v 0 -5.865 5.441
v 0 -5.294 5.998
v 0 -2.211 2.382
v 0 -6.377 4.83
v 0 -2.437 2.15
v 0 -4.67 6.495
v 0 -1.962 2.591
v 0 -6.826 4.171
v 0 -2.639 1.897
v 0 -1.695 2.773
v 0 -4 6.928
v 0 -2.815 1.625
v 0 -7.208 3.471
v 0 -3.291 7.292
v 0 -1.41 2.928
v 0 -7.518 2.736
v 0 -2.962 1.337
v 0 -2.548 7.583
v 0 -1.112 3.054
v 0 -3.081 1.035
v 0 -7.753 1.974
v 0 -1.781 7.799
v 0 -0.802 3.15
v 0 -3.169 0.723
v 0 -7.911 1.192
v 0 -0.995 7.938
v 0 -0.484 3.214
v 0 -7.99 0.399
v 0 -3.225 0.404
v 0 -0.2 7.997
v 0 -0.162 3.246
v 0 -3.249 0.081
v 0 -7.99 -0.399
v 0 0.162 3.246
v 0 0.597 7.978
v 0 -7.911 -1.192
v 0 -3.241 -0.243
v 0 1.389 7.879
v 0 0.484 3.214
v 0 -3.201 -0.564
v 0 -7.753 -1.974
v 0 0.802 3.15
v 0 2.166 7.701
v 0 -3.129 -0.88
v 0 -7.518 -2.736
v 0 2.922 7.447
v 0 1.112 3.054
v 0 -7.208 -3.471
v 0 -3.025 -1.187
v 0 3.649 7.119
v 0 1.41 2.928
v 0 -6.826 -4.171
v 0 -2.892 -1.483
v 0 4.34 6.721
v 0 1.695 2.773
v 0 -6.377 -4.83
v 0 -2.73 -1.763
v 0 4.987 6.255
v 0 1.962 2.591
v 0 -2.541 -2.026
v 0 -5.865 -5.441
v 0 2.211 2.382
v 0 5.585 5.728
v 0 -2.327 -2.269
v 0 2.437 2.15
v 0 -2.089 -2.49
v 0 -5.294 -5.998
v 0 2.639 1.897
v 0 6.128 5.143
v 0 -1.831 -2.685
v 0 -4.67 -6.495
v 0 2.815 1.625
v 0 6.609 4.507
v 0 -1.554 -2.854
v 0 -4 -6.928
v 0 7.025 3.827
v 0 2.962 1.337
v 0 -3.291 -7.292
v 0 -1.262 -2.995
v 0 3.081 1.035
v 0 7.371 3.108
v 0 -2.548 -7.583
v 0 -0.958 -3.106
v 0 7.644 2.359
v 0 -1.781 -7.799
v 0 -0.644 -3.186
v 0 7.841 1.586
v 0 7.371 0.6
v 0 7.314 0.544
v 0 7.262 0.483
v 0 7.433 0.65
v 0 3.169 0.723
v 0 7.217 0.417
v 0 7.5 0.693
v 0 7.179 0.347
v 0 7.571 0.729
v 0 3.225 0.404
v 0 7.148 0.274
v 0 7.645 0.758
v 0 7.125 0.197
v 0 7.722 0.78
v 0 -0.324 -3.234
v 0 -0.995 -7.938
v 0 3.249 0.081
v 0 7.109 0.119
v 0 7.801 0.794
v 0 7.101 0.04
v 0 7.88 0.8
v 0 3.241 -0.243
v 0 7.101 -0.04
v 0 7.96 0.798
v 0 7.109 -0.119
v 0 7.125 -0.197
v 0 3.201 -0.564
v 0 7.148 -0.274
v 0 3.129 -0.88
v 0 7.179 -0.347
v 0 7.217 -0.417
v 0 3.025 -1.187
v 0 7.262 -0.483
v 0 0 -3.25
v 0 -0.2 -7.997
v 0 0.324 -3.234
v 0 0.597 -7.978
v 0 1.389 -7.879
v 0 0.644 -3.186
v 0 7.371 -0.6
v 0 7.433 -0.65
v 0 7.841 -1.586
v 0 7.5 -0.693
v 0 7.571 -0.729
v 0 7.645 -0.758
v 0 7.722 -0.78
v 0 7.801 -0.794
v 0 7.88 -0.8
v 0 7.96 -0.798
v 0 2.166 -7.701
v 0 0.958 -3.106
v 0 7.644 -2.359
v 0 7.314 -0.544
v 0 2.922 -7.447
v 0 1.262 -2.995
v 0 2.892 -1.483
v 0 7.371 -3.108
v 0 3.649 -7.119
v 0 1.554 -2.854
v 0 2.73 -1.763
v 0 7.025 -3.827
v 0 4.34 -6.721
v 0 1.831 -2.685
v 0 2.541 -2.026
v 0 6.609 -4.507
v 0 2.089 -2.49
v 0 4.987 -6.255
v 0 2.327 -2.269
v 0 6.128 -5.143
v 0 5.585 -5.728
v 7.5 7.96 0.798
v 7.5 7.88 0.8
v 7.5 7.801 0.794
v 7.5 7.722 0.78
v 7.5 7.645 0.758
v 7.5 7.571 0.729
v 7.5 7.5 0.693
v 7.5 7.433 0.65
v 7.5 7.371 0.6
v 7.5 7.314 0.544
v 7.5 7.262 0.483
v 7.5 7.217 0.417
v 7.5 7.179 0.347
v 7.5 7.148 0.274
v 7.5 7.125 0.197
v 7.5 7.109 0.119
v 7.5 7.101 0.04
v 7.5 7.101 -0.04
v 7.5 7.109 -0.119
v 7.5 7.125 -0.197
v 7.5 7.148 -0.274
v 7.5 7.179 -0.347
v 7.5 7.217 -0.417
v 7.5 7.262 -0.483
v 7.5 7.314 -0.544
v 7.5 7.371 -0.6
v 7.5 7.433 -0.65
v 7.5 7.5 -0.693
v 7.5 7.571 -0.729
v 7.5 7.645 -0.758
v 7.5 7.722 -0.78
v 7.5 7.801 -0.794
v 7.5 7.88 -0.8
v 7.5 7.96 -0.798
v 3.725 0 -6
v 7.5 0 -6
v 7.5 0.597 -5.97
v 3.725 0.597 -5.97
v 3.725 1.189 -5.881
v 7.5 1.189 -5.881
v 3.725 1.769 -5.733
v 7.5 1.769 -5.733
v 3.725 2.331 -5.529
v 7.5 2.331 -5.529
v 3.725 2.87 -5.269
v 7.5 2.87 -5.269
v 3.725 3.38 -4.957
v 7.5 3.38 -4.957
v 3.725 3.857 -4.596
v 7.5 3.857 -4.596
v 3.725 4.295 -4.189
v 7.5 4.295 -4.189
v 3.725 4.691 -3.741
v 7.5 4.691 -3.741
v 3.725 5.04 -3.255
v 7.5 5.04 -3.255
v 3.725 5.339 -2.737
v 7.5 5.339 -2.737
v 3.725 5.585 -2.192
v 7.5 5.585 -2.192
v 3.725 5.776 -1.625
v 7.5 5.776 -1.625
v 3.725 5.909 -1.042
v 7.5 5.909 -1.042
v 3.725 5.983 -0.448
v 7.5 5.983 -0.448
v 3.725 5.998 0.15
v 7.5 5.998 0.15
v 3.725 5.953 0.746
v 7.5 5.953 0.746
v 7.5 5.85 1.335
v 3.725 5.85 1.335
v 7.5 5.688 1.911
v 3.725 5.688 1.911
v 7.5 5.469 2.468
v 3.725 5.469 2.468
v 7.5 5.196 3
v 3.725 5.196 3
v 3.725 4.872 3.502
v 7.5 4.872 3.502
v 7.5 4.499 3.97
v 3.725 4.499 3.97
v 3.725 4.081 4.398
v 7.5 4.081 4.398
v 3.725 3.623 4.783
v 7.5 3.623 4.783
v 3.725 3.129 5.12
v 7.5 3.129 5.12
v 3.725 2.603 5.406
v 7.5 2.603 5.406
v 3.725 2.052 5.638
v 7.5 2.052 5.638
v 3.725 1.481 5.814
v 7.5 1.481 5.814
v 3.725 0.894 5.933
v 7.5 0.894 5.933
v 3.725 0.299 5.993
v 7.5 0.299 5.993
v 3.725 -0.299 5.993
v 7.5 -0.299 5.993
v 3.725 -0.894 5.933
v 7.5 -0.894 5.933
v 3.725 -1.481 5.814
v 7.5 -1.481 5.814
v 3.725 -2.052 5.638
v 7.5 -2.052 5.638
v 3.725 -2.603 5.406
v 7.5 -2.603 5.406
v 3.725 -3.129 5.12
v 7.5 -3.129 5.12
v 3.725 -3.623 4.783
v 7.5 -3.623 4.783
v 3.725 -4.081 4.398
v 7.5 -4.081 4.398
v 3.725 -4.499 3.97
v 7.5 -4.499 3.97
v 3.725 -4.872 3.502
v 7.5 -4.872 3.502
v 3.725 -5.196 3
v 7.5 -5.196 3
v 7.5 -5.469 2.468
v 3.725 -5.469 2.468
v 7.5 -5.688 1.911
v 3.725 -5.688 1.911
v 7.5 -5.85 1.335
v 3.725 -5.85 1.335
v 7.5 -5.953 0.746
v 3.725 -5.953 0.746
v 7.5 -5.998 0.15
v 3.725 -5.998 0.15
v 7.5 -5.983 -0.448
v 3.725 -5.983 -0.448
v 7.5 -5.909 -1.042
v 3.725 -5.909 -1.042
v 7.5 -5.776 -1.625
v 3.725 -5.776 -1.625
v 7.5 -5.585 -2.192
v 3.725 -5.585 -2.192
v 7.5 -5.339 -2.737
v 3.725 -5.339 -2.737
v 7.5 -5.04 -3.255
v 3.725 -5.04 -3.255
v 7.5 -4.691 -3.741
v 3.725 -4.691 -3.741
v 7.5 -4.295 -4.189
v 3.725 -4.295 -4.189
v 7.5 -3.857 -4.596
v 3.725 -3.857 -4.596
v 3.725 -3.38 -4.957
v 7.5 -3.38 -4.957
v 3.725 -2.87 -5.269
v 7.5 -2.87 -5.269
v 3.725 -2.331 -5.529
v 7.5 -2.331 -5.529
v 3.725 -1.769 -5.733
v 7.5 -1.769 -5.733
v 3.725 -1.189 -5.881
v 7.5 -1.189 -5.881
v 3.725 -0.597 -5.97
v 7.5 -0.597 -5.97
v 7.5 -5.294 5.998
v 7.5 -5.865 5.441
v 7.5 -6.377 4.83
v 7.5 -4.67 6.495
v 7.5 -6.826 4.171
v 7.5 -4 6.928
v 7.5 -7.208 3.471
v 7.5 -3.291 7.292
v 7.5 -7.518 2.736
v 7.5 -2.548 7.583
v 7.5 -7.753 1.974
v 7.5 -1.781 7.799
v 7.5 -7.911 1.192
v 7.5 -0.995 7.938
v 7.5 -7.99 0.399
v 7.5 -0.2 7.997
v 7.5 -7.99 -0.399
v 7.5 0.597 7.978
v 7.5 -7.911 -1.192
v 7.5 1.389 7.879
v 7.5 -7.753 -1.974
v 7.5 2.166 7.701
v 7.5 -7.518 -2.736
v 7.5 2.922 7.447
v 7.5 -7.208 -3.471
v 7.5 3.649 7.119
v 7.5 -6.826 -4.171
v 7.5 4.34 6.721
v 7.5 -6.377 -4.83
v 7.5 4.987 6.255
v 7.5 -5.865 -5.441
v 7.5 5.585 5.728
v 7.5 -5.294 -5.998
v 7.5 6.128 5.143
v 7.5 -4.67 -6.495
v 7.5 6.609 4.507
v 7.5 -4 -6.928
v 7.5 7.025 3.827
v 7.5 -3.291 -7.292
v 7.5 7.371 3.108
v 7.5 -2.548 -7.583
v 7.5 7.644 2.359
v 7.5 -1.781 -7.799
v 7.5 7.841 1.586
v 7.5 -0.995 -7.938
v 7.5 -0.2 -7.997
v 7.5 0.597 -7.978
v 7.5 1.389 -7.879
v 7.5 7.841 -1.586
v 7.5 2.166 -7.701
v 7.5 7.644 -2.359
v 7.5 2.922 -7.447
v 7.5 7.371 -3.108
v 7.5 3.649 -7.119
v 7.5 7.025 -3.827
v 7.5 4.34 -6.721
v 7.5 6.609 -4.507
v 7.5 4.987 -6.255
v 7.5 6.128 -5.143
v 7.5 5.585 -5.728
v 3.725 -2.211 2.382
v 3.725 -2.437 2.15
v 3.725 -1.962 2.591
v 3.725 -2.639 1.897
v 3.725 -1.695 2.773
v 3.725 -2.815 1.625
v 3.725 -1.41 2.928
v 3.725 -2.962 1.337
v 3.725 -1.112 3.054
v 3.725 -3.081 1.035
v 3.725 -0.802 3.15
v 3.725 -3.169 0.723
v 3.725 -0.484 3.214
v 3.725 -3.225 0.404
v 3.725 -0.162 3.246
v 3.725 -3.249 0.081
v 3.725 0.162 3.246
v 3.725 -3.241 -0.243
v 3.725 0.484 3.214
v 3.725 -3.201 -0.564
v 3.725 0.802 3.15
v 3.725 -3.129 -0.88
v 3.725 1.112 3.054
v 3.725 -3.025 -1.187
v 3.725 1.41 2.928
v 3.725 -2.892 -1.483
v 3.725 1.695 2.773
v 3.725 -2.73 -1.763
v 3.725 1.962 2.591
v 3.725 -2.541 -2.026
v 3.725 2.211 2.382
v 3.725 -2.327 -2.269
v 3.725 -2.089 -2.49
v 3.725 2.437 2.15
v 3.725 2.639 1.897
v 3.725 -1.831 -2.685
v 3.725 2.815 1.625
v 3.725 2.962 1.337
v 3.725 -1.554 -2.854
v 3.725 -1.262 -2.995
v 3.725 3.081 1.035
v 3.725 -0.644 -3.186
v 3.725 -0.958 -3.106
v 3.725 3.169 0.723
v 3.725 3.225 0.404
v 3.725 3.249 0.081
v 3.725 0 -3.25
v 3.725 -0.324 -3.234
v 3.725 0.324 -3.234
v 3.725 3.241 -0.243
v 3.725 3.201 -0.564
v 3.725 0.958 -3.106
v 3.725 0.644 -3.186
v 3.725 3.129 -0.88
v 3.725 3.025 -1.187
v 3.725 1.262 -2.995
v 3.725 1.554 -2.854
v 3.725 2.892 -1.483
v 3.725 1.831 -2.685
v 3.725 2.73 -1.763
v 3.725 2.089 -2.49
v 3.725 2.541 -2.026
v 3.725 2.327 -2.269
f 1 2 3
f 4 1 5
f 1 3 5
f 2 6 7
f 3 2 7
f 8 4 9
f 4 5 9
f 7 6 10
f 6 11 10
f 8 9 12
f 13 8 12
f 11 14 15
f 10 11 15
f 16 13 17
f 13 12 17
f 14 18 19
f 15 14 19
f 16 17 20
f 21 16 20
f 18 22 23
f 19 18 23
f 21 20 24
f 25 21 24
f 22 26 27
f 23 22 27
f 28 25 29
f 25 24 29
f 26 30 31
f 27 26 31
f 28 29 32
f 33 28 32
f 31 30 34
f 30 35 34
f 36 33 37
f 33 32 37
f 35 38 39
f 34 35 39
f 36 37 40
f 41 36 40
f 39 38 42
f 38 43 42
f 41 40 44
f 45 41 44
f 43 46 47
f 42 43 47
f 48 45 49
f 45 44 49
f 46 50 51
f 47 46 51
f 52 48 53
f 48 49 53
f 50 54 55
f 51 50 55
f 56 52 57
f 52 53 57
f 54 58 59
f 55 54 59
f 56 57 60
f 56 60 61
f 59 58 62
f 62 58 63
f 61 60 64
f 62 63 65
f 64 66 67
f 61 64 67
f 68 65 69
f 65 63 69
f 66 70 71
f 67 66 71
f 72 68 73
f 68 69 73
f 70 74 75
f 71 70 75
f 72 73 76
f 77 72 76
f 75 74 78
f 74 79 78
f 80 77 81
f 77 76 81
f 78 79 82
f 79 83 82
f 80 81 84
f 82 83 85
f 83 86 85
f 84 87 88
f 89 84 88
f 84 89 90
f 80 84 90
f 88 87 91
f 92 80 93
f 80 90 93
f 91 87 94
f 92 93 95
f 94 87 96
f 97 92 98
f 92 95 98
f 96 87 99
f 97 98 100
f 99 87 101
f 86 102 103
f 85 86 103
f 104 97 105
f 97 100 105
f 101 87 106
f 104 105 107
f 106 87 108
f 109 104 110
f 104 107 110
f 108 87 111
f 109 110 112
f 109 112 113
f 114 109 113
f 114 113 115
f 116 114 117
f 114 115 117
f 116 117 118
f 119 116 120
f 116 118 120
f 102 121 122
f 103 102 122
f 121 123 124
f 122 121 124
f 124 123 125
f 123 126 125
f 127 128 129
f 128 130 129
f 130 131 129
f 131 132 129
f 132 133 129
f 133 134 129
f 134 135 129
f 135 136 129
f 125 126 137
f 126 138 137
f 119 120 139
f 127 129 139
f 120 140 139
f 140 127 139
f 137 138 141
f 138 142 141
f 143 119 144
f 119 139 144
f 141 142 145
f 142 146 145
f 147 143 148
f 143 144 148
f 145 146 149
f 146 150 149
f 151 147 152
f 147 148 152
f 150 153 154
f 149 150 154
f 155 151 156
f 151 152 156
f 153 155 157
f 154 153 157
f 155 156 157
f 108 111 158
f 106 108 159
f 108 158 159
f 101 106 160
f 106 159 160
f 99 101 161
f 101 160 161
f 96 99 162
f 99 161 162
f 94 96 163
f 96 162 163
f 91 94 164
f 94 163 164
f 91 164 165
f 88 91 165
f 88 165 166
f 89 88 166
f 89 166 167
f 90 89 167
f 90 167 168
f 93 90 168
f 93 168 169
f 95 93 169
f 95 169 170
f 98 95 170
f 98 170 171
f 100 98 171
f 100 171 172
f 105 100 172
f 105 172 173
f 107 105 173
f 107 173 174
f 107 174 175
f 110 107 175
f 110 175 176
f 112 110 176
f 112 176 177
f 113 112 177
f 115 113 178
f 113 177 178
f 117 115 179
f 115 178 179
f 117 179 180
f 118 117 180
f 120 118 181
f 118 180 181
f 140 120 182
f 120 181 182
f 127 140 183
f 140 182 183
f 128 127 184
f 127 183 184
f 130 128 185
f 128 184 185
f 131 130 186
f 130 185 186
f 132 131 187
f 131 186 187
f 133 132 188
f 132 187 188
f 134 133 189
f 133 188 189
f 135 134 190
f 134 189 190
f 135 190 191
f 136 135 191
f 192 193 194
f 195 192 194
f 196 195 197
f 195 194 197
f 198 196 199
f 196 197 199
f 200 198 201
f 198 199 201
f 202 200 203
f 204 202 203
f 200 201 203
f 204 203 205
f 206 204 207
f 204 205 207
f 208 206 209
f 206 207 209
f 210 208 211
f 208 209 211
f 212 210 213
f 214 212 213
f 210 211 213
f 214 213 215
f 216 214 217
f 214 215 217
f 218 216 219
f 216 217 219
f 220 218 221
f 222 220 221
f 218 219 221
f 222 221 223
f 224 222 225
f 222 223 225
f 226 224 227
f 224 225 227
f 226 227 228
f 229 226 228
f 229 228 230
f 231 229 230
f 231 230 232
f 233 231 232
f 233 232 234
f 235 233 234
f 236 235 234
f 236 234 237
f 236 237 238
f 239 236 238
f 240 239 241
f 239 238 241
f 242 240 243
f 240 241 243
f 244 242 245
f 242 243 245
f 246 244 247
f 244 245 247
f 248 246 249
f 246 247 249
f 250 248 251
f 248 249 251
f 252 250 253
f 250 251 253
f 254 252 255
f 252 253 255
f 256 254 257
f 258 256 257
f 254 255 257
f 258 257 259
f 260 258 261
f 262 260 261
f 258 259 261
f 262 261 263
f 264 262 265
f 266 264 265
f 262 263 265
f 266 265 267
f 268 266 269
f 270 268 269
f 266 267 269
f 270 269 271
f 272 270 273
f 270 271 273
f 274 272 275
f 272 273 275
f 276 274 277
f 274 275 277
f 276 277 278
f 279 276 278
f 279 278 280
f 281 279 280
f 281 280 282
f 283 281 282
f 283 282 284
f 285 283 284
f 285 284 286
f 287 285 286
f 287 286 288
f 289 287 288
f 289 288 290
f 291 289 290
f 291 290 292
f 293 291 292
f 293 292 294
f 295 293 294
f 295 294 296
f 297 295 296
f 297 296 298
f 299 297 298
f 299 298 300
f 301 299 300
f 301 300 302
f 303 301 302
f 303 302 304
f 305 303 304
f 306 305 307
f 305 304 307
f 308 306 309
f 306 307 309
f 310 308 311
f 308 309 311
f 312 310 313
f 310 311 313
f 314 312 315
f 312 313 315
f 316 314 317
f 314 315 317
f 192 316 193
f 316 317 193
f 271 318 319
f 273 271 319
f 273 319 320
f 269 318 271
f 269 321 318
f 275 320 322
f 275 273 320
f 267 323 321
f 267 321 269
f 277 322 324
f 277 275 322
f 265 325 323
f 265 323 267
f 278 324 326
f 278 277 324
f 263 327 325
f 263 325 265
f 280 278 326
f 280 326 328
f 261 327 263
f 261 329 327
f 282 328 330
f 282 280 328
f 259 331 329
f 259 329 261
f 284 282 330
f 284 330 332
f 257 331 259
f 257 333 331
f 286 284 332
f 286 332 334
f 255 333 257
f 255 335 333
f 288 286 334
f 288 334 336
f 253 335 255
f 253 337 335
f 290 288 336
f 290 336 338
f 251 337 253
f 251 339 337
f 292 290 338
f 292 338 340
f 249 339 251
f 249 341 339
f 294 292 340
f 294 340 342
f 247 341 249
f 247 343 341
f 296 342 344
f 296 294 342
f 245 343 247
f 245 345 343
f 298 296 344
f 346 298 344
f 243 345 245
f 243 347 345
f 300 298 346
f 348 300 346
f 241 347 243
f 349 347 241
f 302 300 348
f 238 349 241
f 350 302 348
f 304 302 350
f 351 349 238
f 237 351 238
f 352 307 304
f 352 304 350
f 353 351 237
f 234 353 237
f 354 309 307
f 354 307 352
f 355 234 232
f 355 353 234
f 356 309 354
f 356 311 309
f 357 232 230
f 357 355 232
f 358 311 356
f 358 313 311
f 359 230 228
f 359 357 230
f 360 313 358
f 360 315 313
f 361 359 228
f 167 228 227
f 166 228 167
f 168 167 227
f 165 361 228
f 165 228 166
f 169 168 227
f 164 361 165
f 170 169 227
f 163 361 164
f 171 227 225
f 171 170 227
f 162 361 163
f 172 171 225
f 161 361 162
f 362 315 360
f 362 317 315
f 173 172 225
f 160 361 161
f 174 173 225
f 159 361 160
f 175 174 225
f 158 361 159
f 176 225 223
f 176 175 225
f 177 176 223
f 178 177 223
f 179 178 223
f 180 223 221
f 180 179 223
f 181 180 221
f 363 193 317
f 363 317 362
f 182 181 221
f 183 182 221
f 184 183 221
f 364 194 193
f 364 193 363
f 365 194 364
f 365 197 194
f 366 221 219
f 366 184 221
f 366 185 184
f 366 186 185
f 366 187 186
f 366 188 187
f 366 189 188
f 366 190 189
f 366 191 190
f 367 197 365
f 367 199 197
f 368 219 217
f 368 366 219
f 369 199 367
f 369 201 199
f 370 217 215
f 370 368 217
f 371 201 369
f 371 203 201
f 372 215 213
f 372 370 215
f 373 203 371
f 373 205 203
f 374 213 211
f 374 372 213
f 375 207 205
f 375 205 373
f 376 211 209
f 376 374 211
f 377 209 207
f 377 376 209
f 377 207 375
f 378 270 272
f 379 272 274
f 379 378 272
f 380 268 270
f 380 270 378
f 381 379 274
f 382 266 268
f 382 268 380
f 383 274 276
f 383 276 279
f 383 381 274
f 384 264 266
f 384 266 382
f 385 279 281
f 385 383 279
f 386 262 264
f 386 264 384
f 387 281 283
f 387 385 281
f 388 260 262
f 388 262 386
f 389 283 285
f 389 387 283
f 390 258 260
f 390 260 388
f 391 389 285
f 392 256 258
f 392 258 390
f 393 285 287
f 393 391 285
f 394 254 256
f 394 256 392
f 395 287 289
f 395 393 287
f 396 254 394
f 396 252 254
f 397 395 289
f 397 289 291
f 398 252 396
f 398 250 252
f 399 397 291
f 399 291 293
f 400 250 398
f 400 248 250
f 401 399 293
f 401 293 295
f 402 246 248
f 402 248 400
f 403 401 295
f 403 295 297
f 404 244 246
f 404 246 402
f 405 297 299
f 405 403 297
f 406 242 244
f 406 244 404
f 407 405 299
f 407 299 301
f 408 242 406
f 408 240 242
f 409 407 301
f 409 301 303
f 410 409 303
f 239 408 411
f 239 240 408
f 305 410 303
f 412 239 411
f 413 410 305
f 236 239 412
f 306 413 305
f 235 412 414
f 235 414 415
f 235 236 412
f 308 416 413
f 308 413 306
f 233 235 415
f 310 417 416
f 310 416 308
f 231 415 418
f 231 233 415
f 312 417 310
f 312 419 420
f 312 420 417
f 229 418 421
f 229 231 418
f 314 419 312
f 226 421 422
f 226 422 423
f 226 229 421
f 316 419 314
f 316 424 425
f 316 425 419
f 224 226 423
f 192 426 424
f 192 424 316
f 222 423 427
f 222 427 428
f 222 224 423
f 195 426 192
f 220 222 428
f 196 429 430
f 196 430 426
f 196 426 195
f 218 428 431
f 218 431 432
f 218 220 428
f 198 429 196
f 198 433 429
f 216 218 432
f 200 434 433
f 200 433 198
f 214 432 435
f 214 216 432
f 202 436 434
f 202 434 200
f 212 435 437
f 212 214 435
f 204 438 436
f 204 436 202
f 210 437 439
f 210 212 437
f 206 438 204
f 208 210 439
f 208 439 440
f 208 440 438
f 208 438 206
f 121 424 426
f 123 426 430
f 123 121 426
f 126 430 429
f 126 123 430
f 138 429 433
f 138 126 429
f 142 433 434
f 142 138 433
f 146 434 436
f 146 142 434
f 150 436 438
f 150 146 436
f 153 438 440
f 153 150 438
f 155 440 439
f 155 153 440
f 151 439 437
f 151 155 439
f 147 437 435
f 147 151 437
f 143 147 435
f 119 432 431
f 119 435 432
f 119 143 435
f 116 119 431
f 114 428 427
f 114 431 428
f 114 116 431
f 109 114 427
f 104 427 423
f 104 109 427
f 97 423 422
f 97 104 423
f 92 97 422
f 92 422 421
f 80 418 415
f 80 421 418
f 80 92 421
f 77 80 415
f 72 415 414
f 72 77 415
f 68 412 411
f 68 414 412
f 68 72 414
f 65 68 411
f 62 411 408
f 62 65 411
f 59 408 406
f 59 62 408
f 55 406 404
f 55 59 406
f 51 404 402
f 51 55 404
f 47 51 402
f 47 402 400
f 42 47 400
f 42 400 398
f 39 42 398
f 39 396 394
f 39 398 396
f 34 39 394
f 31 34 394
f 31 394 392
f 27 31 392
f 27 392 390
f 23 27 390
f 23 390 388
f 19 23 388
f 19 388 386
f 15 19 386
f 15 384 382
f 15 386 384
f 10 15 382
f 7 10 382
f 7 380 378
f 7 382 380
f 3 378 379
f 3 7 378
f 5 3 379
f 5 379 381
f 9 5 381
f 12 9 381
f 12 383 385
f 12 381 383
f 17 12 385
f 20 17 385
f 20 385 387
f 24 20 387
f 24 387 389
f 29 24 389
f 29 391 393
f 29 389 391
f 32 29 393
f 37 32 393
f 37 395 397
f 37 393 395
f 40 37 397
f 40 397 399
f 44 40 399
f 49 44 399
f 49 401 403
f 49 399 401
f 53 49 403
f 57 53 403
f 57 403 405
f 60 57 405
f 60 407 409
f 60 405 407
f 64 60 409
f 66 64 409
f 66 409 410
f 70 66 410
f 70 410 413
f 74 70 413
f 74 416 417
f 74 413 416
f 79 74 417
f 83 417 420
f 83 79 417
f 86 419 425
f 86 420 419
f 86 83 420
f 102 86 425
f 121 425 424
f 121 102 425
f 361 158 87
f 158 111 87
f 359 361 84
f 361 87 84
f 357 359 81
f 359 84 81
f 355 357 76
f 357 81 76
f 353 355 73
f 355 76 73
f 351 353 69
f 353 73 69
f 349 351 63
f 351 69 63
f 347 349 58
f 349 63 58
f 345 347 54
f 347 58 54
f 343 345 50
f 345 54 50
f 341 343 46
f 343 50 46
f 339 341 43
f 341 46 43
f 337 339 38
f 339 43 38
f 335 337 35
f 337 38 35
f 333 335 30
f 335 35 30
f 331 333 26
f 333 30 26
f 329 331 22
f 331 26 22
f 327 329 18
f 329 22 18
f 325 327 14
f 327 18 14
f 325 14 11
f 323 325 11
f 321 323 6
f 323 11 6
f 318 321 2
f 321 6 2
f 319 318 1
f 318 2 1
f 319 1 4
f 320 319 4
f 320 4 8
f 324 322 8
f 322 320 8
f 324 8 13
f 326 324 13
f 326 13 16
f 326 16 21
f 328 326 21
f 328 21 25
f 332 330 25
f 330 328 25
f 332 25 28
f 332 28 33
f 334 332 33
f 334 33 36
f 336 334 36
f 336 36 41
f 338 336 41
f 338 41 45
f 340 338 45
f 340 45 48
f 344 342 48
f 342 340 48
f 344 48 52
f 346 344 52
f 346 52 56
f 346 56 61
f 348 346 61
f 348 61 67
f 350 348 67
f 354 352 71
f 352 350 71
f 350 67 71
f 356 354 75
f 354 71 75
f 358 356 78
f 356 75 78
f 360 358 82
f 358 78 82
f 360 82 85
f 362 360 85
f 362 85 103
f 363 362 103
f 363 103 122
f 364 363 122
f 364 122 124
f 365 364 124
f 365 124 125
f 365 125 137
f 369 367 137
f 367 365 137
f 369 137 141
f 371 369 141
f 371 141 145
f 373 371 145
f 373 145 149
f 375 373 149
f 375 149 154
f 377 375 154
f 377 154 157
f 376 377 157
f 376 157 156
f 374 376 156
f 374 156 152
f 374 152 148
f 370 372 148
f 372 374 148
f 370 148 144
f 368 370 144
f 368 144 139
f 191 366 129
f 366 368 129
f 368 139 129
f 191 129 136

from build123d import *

# Parameters (mm, degrees)
SKETCH2_R           = 8
SKETCH2_R_2         = 3.25
BOSS_EXTRUDE1_DEPTH = 7.5
SKETCH3_R           = 6
CUT_EXTRUDE1_DEPTH  = 3.775
SKETCH4_R           = 0.8
CUT_EXTRUDE2_DEPTH  = 10


with BuildPart() as part:
    # Sketch2 → Boss-Extrude1 (new body)
    with BuildSketch(Plane(origin=(0, 0, 0), x_dir=(0, 0, -1), z_dir=(1, 0, 0))):
        Circle(SKETCH2_R)
        Circle(SKETCH2_R_2, mode=Mode.SUBTRACT)
    extrude(amount=BOSS_EXTRUDE1_DEPTH)

    # Sketch3 → Cut-Extrude1 (cut)
    with BuildSketch(Plane(origin=(7.5, 0, 0), x_dir=(0, 0, -1), z_dir=(1, 0, 0))):
        Circle(SKETCH3_R)
    extrude(amount=-CUT_EXTRUDE1_DEPTH, mode=Mode.SUBTRACT)

    # Sketch4 → Cut-Extrude2 (cut)
    with BuildSketch(Plane(origin=(7.5, 0, 0), x_dir=(0, 0, -1), z_dir=(1, 0, 0))):
        with Locations((0, 7.9)):
            Circle(SKETCH4_R)
    extrude(amount=-CUT_EXTRUDE2_DEPTH, mode=Mode.SUBTRACT)


solid = part.part
